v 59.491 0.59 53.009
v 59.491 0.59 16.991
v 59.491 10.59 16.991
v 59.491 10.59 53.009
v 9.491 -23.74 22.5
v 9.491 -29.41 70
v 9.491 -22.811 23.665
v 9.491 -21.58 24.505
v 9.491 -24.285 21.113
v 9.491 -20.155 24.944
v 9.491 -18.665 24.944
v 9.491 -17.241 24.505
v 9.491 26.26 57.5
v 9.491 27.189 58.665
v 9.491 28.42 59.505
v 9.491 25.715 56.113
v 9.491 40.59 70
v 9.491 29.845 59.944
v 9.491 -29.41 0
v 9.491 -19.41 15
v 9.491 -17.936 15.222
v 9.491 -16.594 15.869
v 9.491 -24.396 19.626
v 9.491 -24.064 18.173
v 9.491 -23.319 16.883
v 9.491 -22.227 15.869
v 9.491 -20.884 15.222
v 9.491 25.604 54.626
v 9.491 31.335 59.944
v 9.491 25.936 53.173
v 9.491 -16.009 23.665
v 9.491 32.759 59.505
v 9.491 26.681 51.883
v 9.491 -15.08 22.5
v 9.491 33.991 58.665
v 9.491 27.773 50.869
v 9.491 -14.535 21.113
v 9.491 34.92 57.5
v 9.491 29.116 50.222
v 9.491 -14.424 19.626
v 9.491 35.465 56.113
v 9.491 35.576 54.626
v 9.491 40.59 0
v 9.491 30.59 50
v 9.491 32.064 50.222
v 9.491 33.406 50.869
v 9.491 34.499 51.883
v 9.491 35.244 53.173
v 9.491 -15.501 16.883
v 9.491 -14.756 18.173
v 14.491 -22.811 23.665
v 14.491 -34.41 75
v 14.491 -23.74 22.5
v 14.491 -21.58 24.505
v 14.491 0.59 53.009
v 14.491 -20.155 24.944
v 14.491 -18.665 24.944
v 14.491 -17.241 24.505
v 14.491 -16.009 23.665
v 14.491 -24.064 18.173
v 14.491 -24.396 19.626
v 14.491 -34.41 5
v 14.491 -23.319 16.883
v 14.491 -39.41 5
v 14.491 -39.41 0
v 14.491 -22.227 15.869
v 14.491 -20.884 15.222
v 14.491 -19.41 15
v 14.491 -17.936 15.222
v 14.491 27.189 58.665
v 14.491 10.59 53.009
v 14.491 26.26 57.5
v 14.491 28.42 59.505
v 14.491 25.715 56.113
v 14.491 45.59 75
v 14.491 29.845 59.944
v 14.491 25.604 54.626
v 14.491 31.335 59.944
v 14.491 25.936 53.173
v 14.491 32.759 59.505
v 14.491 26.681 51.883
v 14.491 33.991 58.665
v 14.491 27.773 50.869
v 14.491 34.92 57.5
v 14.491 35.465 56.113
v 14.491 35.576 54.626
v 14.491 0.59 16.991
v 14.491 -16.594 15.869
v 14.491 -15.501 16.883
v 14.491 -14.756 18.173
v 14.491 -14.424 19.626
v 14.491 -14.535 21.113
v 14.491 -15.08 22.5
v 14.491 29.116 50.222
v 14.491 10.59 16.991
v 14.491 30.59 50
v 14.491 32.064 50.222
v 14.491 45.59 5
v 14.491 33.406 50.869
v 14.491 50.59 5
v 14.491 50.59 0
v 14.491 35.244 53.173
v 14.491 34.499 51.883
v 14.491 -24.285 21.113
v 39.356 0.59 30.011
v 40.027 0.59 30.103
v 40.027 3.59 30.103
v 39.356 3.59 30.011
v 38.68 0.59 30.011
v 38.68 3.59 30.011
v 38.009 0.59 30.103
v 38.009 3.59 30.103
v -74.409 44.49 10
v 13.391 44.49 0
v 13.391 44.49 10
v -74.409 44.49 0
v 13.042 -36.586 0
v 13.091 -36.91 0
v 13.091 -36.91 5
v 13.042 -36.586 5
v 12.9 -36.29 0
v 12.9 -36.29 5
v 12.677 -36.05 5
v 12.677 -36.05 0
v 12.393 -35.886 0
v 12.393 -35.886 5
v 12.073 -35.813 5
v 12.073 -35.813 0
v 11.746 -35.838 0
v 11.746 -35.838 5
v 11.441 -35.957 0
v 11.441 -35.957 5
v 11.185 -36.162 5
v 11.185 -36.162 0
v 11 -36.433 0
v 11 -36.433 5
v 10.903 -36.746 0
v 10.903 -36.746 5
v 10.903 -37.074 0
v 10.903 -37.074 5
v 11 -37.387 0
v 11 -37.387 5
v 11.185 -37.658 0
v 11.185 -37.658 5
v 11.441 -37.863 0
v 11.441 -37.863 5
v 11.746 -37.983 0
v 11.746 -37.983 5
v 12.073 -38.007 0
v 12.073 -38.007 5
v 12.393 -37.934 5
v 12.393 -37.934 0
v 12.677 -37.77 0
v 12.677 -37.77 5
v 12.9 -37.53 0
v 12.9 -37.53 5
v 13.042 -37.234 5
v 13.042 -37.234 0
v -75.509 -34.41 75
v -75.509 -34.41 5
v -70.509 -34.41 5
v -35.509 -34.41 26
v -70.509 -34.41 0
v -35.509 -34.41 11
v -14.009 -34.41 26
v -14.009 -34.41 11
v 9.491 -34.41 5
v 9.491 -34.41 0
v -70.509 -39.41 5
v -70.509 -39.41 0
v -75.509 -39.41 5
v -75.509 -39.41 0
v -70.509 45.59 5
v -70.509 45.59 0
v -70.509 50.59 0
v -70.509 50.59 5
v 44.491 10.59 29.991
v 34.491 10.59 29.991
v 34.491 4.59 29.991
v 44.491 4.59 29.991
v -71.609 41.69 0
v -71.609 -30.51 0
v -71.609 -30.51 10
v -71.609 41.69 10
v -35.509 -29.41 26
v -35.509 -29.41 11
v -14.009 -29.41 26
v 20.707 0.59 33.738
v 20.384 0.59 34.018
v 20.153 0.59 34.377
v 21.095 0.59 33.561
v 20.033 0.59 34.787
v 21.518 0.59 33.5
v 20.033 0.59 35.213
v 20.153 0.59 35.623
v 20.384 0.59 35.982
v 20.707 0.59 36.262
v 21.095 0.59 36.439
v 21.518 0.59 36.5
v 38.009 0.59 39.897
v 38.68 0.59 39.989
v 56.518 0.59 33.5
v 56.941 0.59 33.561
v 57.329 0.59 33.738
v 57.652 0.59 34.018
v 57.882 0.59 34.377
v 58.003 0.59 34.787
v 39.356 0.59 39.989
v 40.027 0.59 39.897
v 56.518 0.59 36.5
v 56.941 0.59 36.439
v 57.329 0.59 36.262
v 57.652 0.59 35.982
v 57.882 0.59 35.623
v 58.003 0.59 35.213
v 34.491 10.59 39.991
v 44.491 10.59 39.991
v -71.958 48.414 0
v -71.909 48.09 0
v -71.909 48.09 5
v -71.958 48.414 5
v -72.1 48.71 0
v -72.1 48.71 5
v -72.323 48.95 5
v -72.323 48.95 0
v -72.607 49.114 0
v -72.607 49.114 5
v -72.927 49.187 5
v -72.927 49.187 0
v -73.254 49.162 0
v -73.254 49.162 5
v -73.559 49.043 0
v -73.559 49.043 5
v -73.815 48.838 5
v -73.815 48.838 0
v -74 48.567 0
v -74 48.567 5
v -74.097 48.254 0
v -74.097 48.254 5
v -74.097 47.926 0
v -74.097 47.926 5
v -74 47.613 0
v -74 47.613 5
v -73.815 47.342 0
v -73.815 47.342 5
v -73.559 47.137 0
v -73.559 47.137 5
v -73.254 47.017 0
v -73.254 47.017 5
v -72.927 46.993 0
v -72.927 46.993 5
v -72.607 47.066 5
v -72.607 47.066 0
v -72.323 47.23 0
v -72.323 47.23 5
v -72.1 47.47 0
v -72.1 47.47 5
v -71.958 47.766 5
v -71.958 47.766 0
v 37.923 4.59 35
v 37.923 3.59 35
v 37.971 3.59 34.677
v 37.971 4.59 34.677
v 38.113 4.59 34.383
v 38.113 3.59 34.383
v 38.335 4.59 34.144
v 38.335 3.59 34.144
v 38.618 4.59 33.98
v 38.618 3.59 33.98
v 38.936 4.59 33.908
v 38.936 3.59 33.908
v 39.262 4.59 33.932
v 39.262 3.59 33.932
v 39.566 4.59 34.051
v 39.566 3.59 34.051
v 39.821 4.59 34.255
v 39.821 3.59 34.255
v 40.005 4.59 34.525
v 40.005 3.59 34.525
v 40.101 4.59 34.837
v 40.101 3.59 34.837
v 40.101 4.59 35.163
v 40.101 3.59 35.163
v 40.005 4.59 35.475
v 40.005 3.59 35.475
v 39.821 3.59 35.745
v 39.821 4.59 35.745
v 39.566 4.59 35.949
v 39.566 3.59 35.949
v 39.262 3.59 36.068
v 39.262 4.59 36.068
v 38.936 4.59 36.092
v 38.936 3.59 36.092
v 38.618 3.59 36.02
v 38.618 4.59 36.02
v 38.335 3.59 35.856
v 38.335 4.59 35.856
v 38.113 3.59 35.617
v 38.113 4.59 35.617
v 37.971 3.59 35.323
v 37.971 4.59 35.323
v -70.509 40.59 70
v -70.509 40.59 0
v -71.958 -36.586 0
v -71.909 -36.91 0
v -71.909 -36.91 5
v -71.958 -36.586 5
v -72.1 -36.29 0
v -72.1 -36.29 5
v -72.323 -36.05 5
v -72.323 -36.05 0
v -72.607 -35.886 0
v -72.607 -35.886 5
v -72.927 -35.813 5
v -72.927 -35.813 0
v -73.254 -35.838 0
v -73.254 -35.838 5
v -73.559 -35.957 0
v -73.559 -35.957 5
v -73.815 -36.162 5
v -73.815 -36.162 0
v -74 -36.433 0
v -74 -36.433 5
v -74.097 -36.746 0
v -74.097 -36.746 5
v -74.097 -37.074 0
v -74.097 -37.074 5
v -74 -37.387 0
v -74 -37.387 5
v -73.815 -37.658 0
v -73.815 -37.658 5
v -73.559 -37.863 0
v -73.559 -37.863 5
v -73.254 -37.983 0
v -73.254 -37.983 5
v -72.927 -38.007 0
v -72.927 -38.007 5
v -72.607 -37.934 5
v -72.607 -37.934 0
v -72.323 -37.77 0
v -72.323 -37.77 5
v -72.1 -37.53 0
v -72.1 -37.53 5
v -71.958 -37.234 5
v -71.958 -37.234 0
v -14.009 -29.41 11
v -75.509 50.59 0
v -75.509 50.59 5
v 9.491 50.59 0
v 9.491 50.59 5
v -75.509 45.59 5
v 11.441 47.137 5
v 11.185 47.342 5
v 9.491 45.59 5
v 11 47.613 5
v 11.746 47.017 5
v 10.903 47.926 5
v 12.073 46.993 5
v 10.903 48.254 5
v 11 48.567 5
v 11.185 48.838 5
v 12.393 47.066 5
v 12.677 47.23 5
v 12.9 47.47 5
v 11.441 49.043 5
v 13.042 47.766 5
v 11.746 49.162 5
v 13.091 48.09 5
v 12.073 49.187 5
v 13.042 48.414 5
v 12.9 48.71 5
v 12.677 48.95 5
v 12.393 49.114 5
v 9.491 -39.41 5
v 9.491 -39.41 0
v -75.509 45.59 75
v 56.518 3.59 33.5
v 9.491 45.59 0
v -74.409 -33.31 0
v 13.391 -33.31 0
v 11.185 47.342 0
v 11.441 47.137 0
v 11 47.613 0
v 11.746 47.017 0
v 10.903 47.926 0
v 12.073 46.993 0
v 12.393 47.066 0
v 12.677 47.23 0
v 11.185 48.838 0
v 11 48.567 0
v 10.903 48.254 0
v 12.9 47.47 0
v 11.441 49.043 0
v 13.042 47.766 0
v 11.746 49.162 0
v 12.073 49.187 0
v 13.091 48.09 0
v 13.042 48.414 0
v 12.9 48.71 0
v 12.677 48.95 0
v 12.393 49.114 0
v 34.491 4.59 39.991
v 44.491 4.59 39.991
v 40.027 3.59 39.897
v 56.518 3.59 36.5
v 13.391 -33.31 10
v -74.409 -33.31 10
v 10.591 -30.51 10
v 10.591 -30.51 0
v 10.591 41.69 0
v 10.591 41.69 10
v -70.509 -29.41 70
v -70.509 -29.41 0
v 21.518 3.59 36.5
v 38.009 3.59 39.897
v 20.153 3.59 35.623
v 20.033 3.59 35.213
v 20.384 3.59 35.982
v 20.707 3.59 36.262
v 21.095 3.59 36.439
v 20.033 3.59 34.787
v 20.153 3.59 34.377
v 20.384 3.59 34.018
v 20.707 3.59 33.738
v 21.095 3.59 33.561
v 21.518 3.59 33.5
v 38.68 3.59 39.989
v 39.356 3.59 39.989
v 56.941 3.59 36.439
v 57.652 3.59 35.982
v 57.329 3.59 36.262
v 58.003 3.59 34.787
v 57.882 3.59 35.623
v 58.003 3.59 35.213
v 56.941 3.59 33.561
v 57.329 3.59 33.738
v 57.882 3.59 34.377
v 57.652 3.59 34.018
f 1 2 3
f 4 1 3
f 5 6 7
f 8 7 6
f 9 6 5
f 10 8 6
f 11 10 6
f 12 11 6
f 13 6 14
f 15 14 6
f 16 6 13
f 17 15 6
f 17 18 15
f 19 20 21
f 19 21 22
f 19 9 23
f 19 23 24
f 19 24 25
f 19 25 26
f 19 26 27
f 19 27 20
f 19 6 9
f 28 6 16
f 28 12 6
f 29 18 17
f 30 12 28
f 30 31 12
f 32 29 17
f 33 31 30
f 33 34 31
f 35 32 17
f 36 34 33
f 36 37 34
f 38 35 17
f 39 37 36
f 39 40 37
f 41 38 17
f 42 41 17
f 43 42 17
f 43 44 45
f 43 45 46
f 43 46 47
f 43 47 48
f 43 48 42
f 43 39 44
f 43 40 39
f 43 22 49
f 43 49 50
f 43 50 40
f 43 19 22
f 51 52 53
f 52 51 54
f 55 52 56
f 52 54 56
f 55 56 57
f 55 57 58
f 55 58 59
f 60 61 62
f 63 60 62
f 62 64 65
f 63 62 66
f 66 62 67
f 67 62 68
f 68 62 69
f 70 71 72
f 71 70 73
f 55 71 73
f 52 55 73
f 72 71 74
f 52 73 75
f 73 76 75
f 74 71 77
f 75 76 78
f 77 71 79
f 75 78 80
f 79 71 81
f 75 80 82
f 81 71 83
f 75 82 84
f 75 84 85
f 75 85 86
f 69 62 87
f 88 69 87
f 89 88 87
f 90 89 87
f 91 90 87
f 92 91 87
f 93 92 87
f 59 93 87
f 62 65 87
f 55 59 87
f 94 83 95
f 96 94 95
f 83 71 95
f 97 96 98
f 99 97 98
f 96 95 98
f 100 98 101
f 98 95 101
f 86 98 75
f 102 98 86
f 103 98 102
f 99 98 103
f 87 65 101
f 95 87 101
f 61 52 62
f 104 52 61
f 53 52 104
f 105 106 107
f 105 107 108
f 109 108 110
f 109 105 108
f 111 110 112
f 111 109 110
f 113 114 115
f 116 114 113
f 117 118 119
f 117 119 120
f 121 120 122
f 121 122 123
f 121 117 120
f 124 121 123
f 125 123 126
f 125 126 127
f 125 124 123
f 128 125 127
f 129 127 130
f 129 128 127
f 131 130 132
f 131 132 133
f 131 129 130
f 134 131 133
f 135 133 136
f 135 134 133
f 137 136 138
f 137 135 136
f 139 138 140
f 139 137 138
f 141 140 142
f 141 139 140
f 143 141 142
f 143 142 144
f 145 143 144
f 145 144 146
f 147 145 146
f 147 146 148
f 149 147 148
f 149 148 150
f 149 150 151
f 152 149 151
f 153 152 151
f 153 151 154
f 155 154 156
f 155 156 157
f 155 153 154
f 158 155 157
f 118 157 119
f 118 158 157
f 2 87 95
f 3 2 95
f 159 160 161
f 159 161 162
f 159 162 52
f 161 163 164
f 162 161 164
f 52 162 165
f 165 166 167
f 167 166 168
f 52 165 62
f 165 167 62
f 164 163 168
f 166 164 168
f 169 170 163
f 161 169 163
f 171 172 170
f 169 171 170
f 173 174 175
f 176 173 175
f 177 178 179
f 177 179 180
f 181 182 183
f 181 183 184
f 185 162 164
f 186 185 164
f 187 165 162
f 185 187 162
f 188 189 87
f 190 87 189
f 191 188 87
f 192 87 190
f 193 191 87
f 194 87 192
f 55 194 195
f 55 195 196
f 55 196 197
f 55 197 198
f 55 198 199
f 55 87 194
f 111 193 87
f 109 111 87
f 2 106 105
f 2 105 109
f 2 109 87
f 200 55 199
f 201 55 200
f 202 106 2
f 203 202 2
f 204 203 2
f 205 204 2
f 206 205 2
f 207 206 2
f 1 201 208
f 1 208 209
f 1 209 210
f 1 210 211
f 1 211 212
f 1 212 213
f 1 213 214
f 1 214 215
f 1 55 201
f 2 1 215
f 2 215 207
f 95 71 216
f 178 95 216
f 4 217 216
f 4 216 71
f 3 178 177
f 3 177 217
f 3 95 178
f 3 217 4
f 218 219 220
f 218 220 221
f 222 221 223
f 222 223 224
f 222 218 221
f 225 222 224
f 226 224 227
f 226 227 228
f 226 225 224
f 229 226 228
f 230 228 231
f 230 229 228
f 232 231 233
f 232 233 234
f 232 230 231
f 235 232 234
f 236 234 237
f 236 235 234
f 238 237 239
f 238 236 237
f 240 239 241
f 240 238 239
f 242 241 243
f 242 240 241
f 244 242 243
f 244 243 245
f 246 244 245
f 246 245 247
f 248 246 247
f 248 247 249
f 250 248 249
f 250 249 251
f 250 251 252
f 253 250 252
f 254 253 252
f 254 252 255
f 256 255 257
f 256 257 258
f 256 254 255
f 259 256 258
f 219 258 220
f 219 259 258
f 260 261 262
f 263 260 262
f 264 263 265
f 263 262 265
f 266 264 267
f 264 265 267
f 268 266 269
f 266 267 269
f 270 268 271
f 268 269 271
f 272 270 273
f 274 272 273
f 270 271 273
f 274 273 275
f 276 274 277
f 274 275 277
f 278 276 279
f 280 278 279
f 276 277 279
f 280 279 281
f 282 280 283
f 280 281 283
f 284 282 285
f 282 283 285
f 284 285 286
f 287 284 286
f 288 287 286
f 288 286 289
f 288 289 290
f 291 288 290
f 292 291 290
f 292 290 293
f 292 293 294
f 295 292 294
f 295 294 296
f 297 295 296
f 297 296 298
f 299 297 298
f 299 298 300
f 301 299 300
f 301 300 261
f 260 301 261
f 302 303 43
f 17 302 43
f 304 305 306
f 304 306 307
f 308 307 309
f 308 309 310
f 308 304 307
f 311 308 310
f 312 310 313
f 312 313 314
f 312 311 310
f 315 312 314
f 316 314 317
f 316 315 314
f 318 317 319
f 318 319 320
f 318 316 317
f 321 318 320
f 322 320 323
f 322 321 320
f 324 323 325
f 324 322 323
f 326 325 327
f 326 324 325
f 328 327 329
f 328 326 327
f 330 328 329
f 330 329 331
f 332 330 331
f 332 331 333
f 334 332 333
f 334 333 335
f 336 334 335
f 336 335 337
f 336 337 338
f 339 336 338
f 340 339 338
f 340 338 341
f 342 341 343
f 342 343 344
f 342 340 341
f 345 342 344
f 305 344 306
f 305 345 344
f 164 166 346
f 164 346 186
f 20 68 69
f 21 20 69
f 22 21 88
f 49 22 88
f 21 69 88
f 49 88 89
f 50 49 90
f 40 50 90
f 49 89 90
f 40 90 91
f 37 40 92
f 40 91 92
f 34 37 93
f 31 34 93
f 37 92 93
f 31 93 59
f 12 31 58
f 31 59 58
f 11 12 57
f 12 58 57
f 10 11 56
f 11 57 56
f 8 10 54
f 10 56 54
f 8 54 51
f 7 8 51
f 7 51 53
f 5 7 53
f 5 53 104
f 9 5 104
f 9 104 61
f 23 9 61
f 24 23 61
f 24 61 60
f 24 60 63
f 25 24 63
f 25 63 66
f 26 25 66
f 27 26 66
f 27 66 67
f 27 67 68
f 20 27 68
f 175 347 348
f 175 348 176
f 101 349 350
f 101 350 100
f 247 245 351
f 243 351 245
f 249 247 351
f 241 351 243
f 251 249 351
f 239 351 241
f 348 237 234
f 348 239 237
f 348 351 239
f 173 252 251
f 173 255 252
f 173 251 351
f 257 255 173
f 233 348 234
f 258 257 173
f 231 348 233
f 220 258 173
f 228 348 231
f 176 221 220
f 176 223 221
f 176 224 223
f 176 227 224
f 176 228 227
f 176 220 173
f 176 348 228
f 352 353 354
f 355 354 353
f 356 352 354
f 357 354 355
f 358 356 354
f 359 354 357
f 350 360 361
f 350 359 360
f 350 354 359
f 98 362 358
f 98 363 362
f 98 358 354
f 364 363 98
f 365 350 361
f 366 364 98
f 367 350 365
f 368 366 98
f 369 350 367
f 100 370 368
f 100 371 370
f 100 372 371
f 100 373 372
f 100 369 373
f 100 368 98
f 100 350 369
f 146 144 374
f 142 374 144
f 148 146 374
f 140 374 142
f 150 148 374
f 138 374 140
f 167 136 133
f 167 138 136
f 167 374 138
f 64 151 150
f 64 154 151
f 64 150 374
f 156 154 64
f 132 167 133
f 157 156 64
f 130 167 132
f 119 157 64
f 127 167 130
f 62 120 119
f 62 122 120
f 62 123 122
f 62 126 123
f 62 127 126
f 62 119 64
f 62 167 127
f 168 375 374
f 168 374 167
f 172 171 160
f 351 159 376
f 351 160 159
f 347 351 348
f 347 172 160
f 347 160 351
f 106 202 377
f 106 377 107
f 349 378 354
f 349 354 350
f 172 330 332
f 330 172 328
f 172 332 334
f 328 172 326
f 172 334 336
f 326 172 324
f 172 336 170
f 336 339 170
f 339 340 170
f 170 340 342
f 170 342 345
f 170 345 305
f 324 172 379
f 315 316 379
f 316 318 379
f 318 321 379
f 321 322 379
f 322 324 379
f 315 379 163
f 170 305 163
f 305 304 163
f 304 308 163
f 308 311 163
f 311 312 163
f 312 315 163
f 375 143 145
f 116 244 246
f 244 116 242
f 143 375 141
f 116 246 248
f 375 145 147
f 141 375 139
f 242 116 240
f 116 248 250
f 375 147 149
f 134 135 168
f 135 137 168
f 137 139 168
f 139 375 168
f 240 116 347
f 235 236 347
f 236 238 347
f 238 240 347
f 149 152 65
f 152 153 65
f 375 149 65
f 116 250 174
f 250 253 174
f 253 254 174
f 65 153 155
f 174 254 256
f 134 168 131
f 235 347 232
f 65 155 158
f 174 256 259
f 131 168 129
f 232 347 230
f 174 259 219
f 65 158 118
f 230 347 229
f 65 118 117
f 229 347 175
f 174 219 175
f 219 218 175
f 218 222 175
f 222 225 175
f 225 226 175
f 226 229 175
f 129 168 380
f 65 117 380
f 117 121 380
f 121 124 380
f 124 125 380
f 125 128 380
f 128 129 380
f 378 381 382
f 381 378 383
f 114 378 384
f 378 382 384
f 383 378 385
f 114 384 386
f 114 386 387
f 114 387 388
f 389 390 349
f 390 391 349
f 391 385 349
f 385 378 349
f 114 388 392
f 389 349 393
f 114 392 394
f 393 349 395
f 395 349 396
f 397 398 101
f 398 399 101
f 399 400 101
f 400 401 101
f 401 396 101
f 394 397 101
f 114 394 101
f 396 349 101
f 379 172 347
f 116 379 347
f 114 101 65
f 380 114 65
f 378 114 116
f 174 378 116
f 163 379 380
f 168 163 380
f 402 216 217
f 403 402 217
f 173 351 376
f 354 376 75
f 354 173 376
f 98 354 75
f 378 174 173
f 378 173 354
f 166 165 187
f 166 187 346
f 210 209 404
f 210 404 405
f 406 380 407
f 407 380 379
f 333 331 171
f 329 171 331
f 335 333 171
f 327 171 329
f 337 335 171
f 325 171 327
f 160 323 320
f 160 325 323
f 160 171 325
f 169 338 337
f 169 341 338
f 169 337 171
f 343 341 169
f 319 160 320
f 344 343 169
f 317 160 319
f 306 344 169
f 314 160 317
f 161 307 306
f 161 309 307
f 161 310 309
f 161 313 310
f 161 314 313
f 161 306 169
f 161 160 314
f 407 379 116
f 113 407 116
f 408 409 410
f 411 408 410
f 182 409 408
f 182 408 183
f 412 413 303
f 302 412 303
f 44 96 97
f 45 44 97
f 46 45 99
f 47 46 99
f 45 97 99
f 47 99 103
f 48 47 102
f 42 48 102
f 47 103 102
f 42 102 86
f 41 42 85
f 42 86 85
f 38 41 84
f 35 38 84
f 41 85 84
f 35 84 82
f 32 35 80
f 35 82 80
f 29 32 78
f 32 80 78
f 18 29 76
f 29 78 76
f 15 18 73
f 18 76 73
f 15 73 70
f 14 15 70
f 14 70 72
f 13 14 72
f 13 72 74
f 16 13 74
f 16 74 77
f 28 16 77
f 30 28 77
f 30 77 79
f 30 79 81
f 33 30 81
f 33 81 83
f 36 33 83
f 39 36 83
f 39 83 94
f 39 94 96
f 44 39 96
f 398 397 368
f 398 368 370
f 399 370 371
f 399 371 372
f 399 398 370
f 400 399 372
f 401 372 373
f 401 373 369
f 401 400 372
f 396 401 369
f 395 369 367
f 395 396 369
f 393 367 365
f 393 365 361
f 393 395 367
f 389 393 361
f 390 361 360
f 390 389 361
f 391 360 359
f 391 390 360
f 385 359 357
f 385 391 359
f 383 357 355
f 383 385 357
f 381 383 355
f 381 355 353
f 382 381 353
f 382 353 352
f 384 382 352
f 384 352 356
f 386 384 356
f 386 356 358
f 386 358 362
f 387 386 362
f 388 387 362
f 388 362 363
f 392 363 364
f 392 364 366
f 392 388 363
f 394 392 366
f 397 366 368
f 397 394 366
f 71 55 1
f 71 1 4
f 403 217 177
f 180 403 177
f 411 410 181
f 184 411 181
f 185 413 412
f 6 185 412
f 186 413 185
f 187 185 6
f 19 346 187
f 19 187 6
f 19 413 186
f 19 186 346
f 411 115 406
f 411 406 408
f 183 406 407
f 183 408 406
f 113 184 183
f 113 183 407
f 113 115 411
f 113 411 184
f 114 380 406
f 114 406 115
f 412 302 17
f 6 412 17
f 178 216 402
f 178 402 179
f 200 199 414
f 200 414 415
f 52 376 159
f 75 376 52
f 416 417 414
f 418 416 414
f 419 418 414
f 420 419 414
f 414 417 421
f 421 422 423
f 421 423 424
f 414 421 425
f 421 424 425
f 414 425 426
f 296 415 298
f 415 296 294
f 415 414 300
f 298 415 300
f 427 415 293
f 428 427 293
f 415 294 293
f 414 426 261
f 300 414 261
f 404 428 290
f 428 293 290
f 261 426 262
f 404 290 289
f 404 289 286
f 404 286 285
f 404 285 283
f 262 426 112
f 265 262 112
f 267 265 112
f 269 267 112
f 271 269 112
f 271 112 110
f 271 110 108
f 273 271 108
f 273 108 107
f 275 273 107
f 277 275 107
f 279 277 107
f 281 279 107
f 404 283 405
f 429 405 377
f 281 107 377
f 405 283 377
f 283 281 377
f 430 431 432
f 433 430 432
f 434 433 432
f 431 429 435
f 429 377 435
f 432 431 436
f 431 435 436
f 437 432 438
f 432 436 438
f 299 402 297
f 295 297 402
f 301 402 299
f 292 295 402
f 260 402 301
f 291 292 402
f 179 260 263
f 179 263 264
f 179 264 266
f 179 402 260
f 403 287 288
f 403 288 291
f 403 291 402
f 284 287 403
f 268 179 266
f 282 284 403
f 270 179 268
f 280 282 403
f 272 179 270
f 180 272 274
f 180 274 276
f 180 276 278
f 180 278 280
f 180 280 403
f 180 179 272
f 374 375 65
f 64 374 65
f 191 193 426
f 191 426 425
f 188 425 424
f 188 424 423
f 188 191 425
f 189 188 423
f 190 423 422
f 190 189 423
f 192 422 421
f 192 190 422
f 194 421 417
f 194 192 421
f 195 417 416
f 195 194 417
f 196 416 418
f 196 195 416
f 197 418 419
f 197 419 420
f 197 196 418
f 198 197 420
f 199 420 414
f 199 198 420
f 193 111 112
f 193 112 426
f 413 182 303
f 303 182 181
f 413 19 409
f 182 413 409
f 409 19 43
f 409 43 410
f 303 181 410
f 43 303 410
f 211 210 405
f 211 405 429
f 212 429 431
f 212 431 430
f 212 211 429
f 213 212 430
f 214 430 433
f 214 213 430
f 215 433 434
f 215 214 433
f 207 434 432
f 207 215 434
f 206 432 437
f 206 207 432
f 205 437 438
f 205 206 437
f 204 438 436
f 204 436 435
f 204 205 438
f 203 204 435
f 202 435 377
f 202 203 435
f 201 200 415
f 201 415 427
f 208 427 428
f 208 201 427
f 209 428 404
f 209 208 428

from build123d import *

# Parameters (mm, degrees)
SKETCH_1_W           = 135
SKETCH_1_H           = 80
EXTRUDE_1_DEPTH      = 70
SKETCH_6_W           = 45
SKETCH_6_H           = 70
CUT_EXTRUDE_1_DEPTH  = 35
SKETCH_5_W           = 45
SKETCH_5_H           = 70
CUT_EXTRUDE_2_DEPTH  = 35
SKETCH_7_W           = 80
SKETCH_7_H           = 70
CUT_EXTRUDE_3_DEPTH  = 75
SKETCH_8_W           = 87.8
SKETCH_8_H           = 77.8
SKETCH_8_W_2         = 82.2
SKETCH_8_H_2         = 72.2
CUT_EXTRUDE_4_DEPTH  = 10
SKETCH_9_R           = 5
CUT_EXTRUDE_5_DEPTH  = 32.4
SKETCH_10_W          = 21.5
SKETCH_10_H          = 15
CUT_EXTRUDE_6_DEPTH  = 10
SKETCH_12_W          = 16.99068276
SKETCH_12_H          = 10
CUT_EXTRUDE_7_DEPTH  = 45
CUT_EXTRUDE_8_DEPTH  = 3
SKETCH_15_W          = 10
SKETCH_15_H          = 10
CUT_EXTRUDE_9_DEPTH  = 6
SKETCH_17_R          = 1.095275866
CUT_EXTRUDE_11_DEPTH = 7
SKETCH_18_W          = 5
SKETCH_18_H          = 5
SKETCH_18_R          = 1.1
EXTRUDE_2_DEPTH      = 5
SKETCH_19_W          = 90
SKETCH_19_H          = 80
EXTRUDE_3_DEPTH      = 5


with BuildPart() as part:
    # 草圖1 → 填料-伸長1 (new body)
    with BuildSketch(Plane.XY):
        with Locations((-8.008902174, 5.58988764)):
            Rectangle(SKETCH_1_W, SKETCH_1_H)
    extrude(amount=EXTRUDE_1_DEPTH)

    # 草圖6 → 除料-伸長1 (cut)
    with BuildSketch(Plane(origin=(0, 45.58988764, 0), x_dir=(1, 0, 0), z_dir=(0, 1, 0))):
        with Locations((36.991097826, -35)):
            Rectangle(SKETCH_6_W, SKETCH_6_H)
    extrude(amount=-CUT_EXTRUDE_1_DEPTH, mode=Mode.SUBTRACT)

    # 草圖5 → 除料-伸長2 (cut)
    with BuildSketch(Plane.XZ.offset(34.41011236)):
        with Locations((36.991097826, 35)):
            Rectangle(SKETCH_5_W, SKETCH_5_H)
    extrude(amount=-CUT_EXTRUDE_2_DEPTH, mode=Mode.SUBTRACT)

    # 草圖7 → 除料-伸長3 (cut)
    with BuildSketch(Plane.XY):
        with Locations((-30.508902174, 5.58988764)):
            Rectangle(SKETCH_7_W, SKETCH_7_H)
    extrude(amount=CUT_EXTRUDE_3_DEPTH, mode=Mode.SUBTRACT)

    # 草圖8 → 除料-伸長4 (cut)
    with BuildSketch(Plane(origin=(0, 0, 0), x_dir=(-1, 0, 0), z_dir=(0, 0, -1))):
        with Locations((30.508902174, 5.58988764)):
            Rectangle(SKETCH_8_W, SKETCH_8_H)
        with Locations((30.508902174, 5.58988764)):
            Rectangle(SKETCH_8_W_2, SKETCH_8_H_2, mode=Mode.SUBTRACT)
    extrude(amount=-CUT_EXTRUDE_4_DEPTH, mode=Mode.SUBTRACT)

    # 草圖9 → 除料-伸長5 (cut)
    with BuildSketch(Plane(origin=(14.491097826, 0, 0), x_dir=(0, 0, -1), z_dir=(1, 0, 0))):
        with Locations((-55, 30.58988764)):
            Circle(SKETCH_9_R)
        with Locations((-20, -19.41011236)):
            Circle(SKETCH_9_R)
    extrude(amount=-CUT_EXTRUDE_5_DEPTH, mode=Mode.SUBTRACT)

    # 草圖10 → 除料-伸長6 (cut)
    with BuildSketch(Plane(origin=(0, -34.41011236, 0), x_dir=(-1, 0, 0), z_dir=(0, -1, 0))):
        with Locations((24.758902174, -18.5)):
            Rectangle(SKETCH_10_W, SKETCH_10_H)
    extrude(amount=-CUT_EXTRUDE_6_DEPTH, mode=Mode.SUBTRACT)

    # 草圖12 → 除料-伸長7 (cut)
    with BuildSketch(Plane(origin=(14.491097826, 0, 0), x_dir=(0, 0, -1), z_dir=(1, 0, 0))):
        with Locations((-61.50465862, 5.58988764)):
            Rectangle(SKETCH_12_W, SKETCH_12_H)
        with Locations((-8.49534138, 5.58988764)):
            Rectangle(SKETCH_12_W, SKETCH_12_H)
    extrude(amount=CUT_EXTRUDE_7_DEPTH, mode=Mode.SUBTRACT)

    # 草圖14 → 除料-伸長8 (cut)
    with BuildSketch(Plane(origin=(0, 0.58988764, 0), x_dir=(-1, 0, 0), z_dir=(0, -1, 0))):
        with BuildLine():
            Line((-38.009101008, -30.10282789), (-21.517914827, -33.5))
            ThreePointArc((-21.517914827, -33.5), (-20.017914827, -35), (-21.517914827, -36.5))
            Line((-21.517914827, -36.5), (-38.009101008, -39.89717211))
            ThreePointArc((-38.009101008, -39.89717211), (-39.017914827, -40), (-40.026728646, -39.89717211))
            Line((-40.026728646, -39.89717211), (-56.517914827, -36.5))
            ThreePointArc((-56.517914827, -36.5), (-58.017914827, -35), (-56.517914827, -33.5))
            Line((-56.517914827, -33.5), (-40.026728646, -30.10282789))
            ThreePointArc((-40.026728646, -30.10282789), (-39.017914827, -30), (-38.009101008, -30.10282789))
        make_face()
    extrude(amount=-CUT_EXTRUDE_8_DEPTH, mode=Mode.SUBTRACT)

    # 草圖15 → 除料-伸長9 (cut)
    with BuildSketch(Plane(origin=(0, 10.58988764, 0), x_dir=(1, 0, 0), z_dir=(0, 1, 0))):
        with Locations((39.491097826, -34.99068276)):
            Rectangle(SKETCH_15_W, SKETCH_15_H)
    extrude(amount=-CUT_EXTRUDE_9_DEPTH, mode=Mode.SUBTRACT)

    # 草圖17 → 除料-伸長11 (cut)
    with BuildSketch(Plane(origin=(0, 0.58988764, 0), x_dir=(-1, 0, 0), z_dir=(0, -1, 0))):
        with Locations((-39.017914827, -35)):
            Circle(SKETCH_17_R)
    extrude(amount=-CUT_EXTRUDE_11_DEPTH, mode=Mode.SUBTRACT)

    # 草圖18 → 填料-伸長2 (add)
    with BuildSketch(Plane.XY):
        with Locations((11.991097826, 48.08988764)):
            Rectangle(SKETCH_18_W, SKETCH_18_H)
        with Locations((11.991097826, 48.08988764)):
            Circle(SKETCH_18_R, mode=Mode.SUBTRACT)
        with Locations((-73.008902174, 48.08988764)):
            Rectangle(SKETCH_18_W, SKETCH_18_H)
        with Locations((-73.008902174, 48.08988764)):
            Circle(SKETCH_18_R, mode=Mode.SUBTRACT)
        with Locations((-73.008902174, -36.91011236)):
            Rectangle(SKETCH_18_W, SKETCH_18_H)
        with Locations((-73.008902174, -36.91011236)):
            Circle(SKETCH_18_R, mode=Mode.SUBTRACT)
        with Locations((11.991097826, -36.91011236)):
            Rectangle(SKETCH_18_W, SKETCH_18_H)
        with Locations((11.991097826, -36.91011236)):
            Circle(SKETCH_18_R, mode=Mode.SUBTRACT)
    extrude(amount=EXTRUDE_2_DEPTH)

    # 草圖19 → 填料-伸長3 (add)
    with BuildSketch(Plane.XY.offset(70)):
        with Locations((-30.508902174, 5.58988764)):
            Rectangle(SKETCH_19_W, SKETCH_19_H)
    extrude(amount=EXTRUDE_3_DEPTH)


solid = part.part
